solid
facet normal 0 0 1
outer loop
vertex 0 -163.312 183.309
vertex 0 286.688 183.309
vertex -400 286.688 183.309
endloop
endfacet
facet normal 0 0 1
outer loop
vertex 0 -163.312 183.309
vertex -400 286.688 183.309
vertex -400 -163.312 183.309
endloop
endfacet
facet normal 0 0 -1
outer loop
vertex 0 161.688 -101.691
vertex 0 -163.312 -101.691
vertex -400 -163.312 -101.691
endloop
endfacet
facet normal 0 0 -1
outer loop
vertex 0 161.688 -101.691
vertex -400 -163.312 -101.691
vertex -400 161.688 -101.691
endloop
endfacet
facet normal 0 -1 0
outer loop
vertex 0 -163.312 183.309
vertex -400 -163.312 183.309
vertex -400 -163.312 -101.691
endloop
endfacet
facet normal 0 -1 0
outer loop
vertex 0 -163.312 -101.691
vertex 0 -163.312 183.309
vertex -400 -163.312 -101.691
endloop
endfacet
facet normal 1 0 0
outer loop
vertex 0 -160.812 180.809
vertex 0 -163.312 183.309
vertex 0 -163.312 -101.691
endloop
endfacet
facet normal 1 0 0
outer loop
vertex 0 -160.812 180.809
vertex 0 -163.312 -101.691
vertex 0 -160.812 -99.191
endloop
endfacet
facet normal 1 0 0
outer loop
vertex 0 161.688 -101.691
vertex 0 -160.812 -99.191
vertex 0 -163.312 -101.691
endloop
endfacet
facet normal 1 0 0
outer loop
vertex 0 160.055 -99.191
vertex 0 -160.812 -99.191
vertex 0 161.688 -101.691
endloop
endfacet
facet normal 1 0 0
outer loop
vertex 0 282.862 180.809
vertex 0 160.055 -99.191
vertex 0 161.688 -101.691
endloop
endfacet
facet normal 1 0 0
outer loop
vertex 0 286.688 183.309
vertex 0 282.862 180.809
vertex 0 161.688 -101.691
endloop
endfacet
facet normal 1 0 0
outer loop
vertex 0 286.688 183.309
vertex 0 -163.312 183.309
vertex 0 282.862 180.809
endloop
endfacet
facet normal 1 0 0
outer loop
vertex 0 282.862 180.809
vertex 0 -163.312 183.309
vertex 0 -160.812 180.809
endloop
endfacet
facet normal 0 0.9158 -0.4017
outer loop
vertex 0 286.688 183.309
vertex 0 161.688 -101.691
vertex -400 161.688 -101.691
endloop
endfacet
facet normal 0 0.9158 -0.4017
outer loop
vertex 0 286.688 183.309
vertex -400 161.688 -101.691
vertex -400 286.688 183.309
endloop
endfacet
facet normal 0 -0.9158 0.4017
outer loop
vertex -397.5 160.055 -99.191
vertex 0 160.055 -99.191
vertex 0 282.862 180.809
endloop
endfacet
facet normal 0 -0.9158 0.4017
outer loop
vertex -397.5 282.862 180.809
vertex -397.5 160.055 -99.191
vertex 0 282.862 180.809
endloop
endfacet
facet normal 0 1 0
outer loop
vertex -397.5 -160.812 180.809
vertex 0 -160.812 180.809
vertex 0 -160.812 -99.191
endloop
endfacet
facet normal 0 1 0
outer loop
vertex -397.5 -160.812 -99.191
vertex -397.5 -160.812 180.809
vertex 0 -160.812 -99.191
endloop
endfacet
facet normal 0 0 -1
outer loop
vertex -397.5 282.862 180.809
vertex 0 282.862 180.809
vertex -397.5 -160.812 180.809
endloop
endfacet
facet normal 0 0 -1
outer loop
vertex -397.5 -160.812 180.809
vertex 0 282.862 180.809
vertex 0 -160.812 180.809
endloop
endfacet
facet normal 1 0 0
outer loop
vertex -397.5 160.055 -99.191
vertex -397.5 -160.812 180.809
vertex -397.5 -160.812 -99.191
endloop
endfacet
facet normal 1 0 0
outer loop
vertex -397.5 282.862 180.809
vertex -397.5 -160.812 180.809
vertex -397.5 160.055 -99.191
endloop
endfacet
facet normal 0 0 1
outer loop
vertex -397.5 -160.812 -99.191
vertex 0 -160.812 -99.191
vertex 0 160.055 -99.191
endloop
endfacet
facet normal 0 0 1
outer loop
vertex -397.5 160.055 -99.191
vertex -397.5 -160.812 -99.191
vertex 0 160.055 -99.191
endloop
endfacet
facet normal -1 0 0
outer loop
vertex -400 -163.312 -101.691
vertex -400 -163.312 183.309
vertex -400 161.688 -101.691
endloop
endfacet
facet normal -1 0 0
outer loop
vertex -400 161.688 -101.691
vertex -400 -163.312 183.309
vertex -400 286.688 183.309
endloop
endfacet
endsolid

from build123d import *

# Parameters (mm, degrees)
F1_DEPTH = 400
F2_T     = -2.5


with BuildPart() as f1:
    # F0 (on Right) → F1 (new body)
    with BuildSketch(Plane.YZ):
        Polygon((286.688396, 183.30926), (-163.311604, 183.30926), (-163.311604, -101.69074), (161.688396, -101.69074), align=None)
    extrude(amount=-F1_DEPTH)

    # F2
    f2_openings = [f1.faces().sort_by_distance(p)[0] for p in [
        (0, 32.118504, 48.470551),
    ]]
    offset(amount=F2_T, openings=f2_openings)


solid = f1.part
